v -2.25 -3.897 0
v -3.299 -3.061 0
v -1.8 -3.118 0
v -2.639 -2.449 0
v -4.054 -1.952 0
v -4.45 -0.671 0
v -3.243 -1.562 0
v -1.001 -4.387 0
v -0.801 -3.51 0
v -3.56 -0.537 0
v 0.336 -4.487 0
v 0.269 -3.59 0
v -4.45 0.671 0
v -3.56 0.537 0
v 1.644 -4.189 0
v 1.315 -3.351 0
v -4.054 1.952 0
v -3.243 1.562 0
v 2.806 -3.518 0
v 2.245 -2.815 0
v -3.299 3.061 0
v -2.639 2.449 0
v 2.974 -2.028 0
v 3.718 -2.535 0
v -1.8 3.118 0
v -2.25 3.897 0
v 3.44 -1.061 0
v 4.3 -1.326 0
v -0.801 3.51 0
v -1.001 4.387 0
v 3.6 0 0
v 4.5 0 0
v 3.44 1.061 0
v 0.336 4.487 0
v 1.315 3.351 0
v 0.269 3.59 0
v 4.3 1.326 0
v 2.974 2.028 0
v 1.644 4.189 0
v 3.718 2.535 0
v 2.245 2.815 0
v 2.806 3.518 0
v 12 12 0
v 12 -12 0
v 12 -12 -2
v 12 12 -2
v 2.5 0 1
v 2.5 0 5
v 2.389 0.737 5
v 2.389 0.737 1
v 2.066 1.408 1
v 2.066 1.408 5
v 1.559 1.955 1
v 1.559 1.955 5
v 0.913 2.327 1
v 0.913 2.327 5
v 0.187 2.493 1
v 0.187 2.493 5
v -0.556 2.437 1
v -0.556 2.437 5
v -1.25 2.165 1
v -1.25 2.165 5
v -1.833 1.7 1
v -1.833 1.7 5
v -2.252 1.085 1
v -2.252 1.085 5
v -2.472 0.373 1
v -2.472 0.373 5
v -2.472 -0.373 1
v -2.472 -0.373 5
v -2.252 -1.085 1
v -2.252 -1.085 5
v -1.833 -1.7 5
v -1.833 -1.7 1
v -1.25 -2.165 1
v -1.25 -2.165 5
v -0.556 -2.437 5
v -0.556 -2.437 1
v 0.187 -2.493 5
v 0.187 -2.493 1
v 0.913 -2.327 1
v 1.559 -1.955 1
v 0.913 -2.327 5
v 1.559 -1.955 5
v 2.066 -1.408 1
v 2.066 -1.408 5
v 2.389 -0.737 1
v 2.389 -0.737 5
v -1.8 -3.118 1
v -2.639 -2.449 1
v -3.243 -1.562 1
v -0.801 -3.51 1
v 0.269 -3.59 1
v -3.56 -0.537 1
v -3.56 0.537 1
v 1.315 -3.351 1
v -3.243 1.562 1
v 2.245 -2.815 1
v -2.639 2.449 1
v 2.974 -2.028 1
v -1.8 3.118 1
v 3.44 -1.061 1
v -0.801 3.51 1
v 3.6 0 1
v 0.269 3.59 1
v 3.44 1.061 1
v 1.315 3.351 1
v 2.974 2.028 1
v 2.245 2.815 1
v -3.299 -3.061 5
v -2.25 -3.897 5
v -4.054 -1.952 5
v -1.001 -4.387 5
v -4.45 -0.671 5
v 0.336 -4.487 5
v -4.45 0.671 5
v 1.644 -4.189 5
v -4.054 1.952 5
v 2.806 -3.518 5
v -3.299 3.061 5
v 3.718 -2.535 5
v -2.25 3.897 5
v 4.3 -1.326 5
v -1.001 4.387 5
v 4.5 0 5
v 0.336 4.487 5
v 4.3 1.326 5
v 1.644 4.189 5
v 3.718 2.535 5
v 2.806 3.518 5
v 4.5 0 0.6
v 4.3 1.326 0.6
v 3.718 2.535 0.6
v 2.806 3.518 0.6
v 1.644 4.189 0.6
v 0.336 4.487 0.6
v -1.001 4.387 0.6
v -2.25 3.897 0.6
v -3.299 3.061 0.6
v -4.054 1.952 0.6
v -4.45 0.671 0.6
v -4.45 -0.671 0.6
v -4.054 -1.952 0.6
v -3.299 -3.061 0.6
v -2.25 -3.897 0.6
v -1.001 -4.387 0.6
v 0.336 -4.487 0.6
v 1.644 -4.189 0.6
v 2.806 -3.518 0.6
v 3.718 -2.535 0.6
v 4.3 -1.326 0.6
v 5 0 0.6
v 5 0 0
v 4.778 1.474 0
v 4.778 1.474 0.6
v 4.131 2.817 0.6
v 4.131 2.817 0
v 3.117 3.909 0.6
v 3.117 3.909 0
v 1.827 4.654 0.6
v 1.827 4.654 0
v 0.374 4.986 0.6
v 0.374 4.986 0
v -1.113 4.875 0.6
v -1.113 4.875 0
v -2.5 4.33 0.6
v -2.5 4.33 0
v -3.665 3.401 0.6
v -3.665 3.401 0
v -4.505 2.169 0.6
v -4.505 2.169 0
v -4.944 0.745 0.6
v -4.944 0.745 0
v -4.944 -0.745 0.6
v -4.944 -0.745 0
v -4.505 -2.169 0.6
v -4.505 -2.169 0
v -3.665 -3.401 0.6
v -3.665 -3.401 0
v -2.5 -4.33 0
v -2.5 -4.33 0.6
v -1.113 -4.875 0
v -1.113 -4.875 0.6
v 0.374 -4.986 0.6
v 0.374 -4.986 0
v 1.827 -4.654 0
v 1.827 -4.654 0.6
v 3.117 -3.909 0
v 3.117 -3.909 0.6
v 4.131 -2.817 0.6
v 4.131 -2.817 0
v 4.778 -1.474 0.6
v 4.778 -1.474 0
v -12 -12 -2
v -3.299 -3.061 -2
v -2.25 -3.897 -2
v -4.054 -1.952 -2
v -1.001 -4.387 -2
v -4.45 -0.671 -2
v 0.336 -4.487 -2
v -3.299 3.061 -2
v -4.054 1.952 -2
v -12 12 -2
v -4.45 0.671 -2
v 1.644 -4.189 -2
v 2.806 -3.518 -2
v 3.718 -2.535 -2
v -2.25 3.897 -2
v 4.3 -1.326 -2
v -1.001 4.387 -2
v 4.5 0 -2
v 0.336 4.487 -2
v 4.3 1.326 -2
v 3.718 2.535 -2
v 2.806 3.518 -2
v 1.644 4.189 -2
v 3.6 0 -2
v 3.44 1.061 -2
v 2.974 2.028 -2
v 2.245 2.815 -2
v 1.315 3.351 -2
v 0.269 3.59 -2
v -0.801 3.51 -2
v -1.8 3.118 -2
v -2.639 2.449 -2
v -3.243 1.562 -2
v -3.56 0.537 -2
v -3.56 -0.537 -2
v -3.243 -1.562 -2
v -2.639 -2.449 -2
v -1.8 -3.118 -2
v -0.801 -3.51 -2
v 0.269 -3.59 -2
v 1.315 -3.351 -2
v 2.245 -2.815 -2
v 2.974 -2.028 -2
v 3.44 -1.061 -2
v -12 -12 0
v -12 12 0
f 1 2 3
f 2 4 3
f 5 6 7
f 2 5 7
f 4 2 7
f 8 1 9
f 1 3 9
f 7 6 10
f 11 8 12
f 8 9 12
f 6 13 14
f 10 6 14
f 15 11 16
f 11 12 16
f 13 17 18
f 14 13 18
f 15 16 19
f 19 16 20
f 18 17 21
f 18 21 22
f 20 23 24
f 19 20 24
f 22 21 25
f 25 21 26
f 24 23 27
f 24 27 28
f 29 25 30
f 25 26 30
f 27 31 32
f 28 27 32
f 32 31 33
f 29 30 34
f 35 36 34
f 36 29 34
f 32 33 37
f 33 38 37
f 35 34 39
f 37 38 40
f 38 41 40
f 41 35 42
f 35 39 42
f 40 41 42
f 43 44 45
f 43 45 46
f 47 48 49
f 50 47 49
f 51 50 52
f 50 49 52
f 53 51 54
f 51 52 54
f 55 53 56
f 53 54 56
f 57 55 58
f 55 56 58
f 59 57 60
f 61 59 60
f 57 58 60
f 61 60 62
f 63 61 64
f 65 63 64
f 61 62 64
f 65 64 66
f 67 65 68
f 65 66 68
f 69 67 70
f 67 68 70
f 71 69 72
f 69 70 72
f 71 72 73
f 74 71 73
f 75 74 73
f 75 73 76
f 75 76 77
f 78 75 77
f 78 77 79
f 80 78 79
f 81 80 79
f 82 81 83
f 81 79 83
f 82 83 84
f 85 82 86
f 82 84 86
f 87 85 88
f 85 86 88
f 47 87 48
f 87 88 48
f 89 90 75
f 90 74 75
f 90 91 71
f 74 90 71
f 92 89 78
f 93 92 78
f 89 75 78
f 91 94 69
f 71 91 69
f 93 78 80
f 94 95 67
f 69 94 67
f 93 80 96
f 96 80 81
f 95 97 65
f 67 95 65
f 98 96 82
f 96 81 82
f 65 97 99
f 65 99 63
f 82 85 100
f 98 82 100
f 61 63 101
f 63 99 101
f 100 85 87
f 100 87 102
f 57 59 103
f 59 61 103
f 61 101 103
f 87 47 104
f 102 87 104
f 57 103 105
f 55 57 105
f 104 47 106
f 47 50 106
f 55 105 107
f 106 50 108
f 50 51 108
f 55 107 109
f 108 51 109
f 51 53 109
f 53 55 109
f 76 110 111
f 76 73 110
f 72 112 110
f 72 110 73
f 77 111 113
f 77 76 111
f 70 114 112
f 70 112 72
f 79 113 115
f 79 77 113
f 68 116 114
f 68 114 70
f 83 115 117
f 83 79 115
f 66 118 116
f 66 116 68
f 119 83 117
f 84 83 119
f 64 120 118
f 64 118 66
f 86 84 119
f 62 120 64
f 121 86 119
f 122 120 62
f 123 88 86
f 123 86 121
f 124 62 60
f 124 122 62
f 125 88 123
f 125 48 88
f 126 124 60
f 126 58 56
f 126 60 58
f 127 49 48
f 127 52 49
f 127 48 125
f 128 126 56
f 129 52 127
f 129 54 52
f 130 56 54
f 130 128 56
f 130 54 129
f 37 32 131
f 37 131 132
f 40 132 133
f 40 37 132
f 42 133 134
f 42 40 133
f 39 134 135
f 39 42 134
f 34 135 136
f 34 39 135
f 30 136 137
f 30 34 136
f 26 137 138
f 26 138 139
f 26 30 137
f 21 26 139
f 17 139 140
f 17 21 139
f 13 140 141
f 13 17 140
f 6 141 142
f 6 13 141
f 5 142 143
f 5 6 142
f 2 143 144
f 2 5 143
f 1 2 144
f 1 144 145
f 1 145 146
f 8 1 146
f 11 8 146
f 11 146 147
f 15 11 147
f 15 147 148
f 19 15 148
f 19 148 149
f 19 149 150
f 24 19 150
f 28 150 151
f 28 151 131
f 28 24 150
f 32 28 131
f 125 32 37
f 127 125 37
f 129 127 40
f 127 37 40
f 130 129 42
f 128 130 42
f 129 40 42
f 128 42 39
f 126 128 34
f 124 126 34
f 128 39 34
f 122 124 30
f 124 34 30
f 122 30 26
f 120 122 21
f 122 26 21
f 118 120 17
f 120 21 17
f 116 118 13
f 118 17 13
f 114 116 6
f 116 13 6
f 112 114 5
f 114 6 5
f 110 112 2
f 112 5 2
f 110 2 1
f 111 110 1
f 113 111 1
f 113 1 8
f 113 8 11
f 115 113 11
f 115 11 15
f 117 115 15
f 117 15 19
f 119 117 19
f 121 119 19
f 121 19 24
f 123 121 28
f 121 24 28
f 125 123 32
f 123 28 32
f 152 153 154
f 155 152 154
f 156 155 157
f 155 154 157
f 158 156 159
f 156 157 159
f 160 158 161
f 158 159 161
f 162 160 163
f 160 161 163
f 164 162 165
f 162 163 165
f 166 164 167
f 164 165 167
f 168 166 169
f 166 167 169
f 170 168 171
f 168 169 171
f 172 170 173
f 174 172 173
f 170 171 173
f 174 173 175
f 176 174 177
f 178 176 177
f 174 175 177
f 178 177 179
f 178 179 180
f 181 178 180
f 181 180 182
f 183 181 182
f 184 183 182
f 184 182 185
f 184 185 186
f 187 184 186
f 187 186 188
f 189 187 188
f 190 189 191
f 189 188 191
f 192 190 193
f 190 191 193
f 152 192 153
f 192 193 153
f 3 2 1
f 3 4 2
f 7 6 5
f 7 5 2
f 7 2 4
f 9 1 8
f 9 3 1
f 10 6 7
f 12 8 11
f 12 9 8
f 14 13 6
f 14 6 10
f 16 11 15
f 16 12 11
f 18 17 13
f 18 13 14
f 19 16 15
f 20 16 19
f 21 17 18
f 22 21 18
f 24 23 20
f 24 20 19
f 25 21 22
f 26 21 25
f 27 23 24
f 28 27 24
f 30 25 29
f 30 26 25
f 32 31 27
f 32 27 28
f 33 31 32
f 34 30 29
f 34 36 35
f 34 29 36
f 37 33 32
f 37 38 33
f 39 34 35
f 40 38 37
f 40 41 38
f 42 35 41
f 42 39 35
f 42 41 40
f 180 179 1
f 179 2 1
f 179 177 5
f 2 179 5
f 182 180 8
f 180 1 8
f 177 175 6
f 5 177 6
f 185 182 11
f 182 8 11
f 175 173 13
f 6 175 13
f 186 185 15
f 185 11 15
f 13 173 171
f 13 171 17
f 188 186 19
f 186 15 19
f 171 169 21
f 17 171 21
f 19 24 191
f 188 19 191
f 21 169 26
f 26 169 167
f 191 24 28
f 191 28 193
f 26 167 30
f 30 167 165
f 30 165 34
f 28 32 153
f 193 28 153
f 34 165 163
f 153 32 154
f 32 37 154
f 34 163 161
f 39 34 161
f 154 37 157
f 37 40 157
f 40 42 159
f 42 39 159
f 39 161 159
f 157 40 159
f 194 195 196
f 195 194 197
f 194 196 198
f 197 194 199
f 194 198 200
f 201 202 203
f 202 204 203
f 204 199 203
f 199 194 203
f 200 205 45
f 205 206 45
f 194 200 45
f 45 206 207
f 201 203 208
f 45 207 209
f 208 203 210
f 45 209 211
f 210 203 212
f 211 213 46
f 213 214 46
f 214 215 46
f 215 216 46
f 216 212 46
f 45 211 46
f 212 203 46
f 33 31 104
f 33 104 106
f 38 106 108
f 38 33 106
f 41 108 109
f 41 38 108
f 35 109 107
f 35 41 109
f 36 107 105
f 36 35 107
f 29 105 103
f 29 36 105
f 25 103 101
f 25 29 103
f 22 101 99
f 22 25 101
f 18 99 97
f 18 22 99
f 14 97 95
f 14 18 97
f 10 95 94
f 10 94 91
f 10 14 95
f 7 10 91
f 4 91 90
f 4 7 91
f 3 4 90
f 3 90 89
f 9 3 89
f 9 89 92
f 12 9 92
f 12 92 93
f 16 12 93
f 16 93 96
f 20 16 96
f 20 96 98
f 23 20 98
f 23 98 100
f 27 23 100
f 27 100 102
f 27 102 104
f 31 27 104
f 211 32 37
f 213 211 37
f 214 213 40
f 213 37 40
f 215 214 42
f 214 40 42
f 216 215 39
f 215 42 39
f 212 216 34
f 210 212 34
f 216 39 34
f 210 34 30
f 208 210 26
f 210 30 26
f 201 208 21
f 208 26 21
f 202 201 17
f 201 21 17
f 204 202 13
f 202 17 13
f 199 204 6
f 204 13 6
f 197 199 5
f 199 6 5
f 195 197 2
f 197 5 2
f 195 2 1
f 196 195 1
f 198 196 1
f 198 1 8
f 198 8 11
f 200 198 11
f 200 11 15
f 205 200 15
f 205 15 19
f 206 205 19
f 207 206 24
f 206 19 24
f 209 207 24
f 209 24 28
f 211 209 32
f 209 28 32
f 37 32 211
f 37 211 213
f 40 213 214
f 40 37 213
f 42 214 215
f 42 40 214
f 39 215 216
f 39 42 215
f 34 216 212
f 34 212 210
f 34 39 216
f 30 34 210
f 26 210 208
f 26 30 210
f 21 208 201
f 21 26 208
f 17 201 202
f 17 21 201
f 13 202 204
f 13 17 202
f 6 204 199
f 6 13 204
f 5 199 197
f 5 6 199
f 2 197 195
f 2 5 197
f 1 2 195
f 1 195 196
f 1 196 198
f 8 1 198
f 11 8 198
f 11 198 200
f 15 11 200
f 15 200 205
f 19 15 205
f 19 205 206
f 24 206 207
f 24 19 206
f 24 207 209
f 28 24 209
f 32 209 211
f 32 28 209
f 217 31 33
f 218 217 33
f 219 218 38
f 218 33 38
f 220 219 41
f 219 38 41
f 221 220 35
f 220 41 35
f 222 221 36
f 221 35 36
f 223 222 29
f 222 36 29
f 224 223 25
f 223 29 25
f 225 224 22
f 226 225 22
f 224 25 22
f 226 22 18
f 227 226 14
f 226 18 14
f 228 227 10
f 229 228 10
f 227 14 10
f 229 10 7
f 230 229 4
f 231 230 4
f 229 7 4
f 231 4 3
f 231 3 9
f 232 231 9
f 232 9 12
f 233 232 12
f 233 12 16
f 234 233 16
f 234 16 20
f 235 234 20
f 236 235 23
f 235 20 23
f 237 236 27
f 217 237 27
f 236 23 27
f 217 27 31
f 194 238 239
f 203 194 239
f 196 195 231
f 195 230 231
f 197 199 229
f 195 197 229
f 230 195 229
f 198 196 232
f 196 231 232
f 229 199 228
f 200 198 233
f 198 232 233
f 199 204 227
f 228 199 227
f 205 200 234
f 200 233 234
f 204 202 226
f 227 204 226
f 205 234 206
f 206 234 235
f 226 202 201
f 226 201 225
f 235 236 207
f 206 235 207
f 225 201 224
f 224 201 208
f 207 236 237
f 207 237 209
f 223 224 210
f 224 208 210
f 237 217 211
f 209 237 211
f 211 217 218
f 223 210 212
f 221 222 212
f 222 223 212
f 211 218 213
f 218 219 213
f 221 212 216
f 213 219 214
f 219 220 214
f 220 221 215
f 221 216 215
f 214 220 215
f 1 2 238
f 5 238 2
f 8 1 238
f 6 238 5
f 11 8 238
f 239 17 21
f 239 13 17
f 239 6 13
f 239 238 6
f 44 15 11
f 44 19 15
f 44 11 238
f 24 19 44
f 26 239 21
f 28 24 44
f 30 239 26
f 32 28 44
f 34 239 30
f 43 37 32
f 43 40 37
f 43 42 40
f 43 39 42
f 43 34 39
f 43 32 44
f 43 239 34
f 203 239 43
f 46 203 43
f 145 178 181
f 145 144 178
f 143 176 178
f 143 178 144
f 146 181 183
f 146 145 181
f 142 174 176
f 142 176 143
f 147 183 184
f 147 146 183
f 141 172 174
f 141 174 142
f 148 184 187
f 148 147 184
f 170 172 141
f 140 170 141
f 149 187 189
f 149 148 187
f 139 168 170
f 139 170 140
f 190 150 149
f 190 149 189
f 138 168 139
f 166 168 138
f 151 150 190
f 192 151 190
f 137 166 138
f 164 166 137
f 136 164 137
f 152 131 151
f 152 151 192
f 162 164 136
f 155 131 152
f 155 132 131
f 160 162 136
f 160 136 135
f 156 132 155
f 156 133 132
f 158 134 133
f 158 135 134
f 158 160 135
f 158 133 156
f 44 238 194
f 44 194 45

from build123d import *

# Parameters (mm, degrees)
F0_W     = 24
F0_H     = 24
F0_R     = 4.5
F1_DEPTH = 2
F0_R_2   = 3.6
F2_DEPTH = 5
F3_R     = 3.6
F3_R_2   = 2.5
F4_DEPTH = 4
F5_DEPTH = 2
F6_R     = 5
F6_R_2   = 4.5
F7_DEPTH = 0.6


with BuildPart() as f1:
    # F0 (on Top) → F1 (new body)
    with BuildSketch(Plane.XY):
        Rectangle(F0_W, F0_H)
        Circle(F0_R, mode=Mode.SUBTRACT)
    extrude(amount=-F1_DEPTH)


with BuildPart() as f2:
    # F0 (on Top) → F2 (new body)
    with BuildSketch(Plane.XY):
        Circle(F0_R)
        Circle(F0_R_2, mode=Mode.SUBTRACT)
    extrude(amount=F2_DEPTH)

    # F3 (on face) → F4 (join)
    with BuildSketch(Plane.XY.offset(5)):
        Circle(F3_R)
        Circle(F3_R_2, mode=Mode.SUBTRACT)
    extrude(amount=-F4_DEPTH)


with BuildPart() as f5:
    # F5 (new): a face of the model
    f5_faces = [f2.part.faces().sort_by_distance(p)[0] for p in [
        (-4.3727207794, 0, 0),
    ]]
    extrude(f5_faces, amount=F5_DEPTH)


with BuildPart() as f7:
    # F6 (on face) → F7 (new body)
    with BuildSketch(Plane.XY):
        Circle(F6_R)
        Circle(F6_R_2, mode=Mode.SUBTRACT)
    extrude(amount=F7_DEPTH)


solid = Compound([f1.part, f2.part, f5.part, f7.part])
